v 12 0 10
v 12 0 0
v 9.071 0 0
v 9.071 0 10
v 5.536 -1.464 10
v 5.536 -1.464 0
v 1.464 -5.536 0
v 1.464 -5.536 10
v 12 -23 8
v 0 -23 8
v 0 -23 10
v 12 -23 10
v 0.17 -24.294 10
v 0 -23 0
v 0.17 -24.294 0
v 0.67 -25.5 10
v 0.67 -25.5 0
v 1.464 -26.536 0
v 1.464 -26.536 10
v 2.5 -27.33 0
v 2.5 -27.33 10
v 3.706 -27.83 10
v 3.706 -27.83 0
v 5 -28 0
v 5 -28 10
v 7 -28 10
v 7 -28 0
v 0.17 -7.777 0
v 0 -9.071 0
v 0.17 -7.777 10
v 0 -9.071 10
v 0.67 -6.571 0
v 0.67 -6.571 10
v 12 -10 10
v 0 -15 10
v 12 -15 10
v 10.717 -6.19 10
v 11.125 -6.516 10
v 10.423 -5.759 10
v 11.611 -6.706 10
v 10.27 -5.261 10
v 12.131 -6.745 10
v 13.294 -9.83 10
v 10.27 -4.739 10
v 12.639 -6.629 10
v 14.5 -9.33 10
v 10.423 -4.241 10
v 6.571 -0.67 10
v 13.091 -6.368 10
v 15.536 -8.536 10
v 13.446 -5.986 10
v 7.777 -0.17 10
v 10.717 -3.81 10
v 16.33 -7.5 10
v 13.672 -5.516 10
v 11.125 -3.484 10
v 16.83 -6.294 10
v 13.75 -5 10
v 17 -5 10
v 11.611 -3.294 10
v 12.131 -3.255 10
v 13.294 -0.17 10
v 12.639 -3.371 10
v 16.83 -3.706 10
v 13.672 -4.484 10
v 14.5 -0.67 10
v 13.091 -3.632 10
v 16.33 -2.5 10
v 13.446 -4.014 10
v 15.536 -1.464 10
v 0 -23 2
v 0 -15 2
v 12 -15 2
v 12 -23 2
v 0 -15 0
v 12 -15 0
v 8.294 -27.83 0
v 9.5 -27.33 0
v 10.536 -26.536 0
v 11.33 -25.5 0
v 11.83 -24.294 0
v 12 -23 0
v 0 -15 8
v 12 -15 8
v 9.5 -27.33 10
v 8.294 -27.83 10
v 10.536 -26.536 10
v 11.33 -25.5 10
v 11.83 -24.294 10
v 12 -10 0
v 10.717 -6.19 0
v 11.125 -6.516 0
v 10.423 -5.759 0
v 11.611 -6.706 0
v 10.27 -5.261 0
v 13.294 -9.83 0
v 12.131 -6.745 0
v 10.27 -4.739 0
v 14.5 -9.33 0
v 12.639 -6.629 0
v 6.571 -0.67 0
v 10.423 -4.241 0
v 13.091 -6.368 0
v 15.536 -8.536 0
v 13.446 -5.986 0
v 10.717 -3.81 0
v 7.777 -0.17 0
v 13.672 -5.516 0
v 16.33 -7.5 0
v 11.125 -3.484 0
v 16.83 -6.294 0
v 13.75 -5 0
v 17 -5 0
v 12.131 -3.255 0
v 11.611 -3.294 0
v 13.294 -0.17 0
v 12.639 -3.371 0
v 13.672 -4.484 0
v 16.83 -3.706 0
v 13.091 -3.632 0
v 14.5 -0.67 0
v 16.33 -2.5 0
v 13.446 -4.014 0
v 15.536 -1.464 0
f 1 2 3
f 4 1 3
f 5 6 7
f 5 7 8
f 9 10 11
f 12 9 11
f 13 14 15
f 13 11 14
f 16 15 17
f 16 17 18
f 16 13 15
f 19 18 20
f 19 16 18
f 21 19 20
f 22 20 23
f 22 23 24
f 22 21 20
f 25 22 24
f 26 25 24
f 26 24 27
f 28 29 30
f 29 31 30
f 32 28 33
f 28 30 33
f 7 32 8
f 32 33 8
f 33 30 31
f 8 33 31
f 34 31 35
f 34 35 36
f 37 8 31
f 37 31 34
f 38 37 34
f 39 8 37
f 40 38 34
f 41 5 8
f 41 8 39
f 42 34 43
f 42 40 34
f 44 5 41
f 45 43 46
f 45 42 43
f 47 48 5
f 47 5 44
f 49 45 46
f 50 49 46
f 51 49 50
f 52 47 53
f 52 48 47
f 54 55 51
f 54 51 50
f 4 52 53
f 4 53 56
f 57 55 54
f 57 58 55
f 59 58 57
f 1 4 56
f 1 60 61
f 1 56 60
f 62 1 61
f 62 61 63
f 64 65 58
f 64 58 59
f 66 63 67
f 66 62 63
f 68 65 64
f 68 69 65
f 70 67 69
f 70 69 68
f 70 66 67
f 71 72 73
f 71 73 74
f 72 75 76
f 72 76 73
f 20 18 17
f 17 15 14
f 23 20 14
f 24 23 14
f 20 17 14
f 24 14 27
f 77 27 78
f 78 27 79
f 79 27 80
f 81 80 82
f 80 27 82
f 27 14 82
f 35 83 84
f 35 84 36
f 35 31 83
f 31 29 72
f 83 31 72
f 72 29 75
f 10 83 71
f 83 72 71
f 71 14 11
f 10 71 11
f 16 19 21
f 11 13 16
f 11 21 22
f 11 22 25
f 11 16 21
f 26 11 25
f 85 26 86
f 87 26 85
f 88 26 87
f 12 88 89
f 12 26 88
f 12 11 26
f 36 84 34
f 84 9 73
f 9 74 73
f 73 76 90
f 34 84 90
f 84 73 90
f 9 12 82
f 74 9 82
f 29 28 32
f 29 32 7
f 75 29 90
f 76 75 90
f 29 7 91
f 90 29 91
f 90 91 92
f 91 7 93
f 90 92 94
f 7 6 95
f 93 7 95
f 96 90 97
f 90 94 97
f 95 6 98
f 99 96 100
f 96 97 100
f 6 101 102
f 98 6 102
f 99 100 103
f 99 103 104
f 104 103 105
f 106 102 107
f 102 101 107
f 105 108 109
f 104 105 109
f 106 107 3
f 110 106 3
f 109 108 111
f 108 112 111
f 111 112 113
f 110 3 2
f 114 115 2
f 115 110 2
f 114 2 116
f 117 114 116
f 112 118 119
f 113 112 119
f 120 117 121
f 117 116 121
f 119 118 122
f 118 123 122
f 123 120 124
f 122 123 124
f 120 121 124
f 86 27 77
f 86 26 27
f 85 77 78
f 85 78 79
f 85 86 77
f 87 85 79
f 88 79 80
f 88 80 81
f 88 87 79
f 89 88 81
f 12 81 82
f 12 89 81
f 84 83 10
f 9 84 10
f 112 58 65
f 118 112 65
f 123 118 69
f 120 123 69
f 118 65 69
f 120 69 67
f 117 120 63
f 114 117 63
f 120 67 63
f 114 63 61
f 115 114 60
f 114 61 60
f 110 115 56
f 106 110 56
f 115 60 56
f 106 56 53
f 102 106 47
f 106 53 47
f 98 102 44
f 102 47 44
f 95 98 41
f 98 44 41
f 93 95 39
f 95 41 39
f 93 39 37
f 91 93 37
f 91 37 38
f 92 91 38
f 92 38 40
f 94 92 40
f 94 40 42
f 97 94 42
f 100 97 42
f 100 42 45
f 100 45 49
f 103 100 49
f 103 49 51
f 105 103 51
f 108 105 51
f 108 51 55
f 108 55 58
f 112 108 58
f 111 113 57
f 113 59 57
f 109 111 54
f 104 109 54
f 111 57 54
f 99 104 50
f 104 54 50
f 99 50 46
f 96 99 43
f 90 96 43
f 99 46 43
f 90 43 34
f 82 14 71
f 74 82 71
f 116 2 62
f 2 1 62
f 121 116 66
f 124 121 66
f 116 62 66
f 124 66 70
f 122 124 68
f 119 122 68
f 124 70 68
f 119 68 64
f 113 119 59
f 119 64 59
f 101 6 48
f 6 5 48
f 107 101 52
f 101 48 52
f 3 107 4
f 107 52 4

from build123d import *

# Parameters (mm, degrees)
F0_W     = 5
F0_H     = 10
F1_DEPTH = 10
F2_R     = 1.75
F3_DEPTH = 25
F4_W     = 8
F4_H     = 2
F5_DEPTH = 25
F6_R     = 4.99999
F7_SIZE  = 7
F8_R     = 5


# Not quite as in the source:
# - a fillet or chamfer is up to 0.001 mm smaller than in the source, because OpenCascade refuses the exact size


with BuildPart() as f1:
    # F0 (on Top) → F1 (new body)
    with BuildSketch(Plane.XY):
        Polygon((12, 0), (0, 0), (0, -28), (12, -28), (12, -10), align=None)
        with Locations((14.5, -5)):
            Rectangle(F0_W, F0_H)
    extrude(amount=F1_DEPTH)

    # F2 (on face) → F3 (cut)
    with BuildSketch(Plane.XY.offset(10)):
        with Locations((12, -5)):
            Circle(F2_R)
    extrude(amount=-F3_DEPTH, mode=Mode.SUBTRACT)

    # F4 (on face) → F5 (cut)
    with BuildSketch(Plane(origin=(0, 0, 0), x_dir=(0, -1, 0), z_dir=(-1, 0, 0))):
        with Locations((19, 1)):
            Rectangle(F4_W, F4_H)
        with Locations((19, 9)):
            Rectangle(F4_W, F4_H)
    extrude(amount=-F5_DEPTH, mode=Mode.SUBTRACT)

    # F6 (radius 5 in the source; OpenCascade refuses exactly that, so slightly less here)
    f6_edges = [f1.edges().sort_by_distance(p)[0] for p in [
        (12, -28, 5),
        (0, -28, 5),
        (17, 0, 5),
        (17, -10, 5),
    ]]
    fillet(f6_edges, radius=F6_R)

    # F7
    f7_edges = [f1.edges().sort_by_distance(p)[0] for p in [
        (0, 0, 5),
    ]]
    chamfer(f7_edges, length=F7_SIZE)

    # F8
    f8_edges = [f1.edges().sort_by_distance(p)[0] for p in [
        (7, 0, 5),
        (0, -7, 5),
    ]]
    fillet(f8_edges, radius=F8_R)


solid = f1.part
